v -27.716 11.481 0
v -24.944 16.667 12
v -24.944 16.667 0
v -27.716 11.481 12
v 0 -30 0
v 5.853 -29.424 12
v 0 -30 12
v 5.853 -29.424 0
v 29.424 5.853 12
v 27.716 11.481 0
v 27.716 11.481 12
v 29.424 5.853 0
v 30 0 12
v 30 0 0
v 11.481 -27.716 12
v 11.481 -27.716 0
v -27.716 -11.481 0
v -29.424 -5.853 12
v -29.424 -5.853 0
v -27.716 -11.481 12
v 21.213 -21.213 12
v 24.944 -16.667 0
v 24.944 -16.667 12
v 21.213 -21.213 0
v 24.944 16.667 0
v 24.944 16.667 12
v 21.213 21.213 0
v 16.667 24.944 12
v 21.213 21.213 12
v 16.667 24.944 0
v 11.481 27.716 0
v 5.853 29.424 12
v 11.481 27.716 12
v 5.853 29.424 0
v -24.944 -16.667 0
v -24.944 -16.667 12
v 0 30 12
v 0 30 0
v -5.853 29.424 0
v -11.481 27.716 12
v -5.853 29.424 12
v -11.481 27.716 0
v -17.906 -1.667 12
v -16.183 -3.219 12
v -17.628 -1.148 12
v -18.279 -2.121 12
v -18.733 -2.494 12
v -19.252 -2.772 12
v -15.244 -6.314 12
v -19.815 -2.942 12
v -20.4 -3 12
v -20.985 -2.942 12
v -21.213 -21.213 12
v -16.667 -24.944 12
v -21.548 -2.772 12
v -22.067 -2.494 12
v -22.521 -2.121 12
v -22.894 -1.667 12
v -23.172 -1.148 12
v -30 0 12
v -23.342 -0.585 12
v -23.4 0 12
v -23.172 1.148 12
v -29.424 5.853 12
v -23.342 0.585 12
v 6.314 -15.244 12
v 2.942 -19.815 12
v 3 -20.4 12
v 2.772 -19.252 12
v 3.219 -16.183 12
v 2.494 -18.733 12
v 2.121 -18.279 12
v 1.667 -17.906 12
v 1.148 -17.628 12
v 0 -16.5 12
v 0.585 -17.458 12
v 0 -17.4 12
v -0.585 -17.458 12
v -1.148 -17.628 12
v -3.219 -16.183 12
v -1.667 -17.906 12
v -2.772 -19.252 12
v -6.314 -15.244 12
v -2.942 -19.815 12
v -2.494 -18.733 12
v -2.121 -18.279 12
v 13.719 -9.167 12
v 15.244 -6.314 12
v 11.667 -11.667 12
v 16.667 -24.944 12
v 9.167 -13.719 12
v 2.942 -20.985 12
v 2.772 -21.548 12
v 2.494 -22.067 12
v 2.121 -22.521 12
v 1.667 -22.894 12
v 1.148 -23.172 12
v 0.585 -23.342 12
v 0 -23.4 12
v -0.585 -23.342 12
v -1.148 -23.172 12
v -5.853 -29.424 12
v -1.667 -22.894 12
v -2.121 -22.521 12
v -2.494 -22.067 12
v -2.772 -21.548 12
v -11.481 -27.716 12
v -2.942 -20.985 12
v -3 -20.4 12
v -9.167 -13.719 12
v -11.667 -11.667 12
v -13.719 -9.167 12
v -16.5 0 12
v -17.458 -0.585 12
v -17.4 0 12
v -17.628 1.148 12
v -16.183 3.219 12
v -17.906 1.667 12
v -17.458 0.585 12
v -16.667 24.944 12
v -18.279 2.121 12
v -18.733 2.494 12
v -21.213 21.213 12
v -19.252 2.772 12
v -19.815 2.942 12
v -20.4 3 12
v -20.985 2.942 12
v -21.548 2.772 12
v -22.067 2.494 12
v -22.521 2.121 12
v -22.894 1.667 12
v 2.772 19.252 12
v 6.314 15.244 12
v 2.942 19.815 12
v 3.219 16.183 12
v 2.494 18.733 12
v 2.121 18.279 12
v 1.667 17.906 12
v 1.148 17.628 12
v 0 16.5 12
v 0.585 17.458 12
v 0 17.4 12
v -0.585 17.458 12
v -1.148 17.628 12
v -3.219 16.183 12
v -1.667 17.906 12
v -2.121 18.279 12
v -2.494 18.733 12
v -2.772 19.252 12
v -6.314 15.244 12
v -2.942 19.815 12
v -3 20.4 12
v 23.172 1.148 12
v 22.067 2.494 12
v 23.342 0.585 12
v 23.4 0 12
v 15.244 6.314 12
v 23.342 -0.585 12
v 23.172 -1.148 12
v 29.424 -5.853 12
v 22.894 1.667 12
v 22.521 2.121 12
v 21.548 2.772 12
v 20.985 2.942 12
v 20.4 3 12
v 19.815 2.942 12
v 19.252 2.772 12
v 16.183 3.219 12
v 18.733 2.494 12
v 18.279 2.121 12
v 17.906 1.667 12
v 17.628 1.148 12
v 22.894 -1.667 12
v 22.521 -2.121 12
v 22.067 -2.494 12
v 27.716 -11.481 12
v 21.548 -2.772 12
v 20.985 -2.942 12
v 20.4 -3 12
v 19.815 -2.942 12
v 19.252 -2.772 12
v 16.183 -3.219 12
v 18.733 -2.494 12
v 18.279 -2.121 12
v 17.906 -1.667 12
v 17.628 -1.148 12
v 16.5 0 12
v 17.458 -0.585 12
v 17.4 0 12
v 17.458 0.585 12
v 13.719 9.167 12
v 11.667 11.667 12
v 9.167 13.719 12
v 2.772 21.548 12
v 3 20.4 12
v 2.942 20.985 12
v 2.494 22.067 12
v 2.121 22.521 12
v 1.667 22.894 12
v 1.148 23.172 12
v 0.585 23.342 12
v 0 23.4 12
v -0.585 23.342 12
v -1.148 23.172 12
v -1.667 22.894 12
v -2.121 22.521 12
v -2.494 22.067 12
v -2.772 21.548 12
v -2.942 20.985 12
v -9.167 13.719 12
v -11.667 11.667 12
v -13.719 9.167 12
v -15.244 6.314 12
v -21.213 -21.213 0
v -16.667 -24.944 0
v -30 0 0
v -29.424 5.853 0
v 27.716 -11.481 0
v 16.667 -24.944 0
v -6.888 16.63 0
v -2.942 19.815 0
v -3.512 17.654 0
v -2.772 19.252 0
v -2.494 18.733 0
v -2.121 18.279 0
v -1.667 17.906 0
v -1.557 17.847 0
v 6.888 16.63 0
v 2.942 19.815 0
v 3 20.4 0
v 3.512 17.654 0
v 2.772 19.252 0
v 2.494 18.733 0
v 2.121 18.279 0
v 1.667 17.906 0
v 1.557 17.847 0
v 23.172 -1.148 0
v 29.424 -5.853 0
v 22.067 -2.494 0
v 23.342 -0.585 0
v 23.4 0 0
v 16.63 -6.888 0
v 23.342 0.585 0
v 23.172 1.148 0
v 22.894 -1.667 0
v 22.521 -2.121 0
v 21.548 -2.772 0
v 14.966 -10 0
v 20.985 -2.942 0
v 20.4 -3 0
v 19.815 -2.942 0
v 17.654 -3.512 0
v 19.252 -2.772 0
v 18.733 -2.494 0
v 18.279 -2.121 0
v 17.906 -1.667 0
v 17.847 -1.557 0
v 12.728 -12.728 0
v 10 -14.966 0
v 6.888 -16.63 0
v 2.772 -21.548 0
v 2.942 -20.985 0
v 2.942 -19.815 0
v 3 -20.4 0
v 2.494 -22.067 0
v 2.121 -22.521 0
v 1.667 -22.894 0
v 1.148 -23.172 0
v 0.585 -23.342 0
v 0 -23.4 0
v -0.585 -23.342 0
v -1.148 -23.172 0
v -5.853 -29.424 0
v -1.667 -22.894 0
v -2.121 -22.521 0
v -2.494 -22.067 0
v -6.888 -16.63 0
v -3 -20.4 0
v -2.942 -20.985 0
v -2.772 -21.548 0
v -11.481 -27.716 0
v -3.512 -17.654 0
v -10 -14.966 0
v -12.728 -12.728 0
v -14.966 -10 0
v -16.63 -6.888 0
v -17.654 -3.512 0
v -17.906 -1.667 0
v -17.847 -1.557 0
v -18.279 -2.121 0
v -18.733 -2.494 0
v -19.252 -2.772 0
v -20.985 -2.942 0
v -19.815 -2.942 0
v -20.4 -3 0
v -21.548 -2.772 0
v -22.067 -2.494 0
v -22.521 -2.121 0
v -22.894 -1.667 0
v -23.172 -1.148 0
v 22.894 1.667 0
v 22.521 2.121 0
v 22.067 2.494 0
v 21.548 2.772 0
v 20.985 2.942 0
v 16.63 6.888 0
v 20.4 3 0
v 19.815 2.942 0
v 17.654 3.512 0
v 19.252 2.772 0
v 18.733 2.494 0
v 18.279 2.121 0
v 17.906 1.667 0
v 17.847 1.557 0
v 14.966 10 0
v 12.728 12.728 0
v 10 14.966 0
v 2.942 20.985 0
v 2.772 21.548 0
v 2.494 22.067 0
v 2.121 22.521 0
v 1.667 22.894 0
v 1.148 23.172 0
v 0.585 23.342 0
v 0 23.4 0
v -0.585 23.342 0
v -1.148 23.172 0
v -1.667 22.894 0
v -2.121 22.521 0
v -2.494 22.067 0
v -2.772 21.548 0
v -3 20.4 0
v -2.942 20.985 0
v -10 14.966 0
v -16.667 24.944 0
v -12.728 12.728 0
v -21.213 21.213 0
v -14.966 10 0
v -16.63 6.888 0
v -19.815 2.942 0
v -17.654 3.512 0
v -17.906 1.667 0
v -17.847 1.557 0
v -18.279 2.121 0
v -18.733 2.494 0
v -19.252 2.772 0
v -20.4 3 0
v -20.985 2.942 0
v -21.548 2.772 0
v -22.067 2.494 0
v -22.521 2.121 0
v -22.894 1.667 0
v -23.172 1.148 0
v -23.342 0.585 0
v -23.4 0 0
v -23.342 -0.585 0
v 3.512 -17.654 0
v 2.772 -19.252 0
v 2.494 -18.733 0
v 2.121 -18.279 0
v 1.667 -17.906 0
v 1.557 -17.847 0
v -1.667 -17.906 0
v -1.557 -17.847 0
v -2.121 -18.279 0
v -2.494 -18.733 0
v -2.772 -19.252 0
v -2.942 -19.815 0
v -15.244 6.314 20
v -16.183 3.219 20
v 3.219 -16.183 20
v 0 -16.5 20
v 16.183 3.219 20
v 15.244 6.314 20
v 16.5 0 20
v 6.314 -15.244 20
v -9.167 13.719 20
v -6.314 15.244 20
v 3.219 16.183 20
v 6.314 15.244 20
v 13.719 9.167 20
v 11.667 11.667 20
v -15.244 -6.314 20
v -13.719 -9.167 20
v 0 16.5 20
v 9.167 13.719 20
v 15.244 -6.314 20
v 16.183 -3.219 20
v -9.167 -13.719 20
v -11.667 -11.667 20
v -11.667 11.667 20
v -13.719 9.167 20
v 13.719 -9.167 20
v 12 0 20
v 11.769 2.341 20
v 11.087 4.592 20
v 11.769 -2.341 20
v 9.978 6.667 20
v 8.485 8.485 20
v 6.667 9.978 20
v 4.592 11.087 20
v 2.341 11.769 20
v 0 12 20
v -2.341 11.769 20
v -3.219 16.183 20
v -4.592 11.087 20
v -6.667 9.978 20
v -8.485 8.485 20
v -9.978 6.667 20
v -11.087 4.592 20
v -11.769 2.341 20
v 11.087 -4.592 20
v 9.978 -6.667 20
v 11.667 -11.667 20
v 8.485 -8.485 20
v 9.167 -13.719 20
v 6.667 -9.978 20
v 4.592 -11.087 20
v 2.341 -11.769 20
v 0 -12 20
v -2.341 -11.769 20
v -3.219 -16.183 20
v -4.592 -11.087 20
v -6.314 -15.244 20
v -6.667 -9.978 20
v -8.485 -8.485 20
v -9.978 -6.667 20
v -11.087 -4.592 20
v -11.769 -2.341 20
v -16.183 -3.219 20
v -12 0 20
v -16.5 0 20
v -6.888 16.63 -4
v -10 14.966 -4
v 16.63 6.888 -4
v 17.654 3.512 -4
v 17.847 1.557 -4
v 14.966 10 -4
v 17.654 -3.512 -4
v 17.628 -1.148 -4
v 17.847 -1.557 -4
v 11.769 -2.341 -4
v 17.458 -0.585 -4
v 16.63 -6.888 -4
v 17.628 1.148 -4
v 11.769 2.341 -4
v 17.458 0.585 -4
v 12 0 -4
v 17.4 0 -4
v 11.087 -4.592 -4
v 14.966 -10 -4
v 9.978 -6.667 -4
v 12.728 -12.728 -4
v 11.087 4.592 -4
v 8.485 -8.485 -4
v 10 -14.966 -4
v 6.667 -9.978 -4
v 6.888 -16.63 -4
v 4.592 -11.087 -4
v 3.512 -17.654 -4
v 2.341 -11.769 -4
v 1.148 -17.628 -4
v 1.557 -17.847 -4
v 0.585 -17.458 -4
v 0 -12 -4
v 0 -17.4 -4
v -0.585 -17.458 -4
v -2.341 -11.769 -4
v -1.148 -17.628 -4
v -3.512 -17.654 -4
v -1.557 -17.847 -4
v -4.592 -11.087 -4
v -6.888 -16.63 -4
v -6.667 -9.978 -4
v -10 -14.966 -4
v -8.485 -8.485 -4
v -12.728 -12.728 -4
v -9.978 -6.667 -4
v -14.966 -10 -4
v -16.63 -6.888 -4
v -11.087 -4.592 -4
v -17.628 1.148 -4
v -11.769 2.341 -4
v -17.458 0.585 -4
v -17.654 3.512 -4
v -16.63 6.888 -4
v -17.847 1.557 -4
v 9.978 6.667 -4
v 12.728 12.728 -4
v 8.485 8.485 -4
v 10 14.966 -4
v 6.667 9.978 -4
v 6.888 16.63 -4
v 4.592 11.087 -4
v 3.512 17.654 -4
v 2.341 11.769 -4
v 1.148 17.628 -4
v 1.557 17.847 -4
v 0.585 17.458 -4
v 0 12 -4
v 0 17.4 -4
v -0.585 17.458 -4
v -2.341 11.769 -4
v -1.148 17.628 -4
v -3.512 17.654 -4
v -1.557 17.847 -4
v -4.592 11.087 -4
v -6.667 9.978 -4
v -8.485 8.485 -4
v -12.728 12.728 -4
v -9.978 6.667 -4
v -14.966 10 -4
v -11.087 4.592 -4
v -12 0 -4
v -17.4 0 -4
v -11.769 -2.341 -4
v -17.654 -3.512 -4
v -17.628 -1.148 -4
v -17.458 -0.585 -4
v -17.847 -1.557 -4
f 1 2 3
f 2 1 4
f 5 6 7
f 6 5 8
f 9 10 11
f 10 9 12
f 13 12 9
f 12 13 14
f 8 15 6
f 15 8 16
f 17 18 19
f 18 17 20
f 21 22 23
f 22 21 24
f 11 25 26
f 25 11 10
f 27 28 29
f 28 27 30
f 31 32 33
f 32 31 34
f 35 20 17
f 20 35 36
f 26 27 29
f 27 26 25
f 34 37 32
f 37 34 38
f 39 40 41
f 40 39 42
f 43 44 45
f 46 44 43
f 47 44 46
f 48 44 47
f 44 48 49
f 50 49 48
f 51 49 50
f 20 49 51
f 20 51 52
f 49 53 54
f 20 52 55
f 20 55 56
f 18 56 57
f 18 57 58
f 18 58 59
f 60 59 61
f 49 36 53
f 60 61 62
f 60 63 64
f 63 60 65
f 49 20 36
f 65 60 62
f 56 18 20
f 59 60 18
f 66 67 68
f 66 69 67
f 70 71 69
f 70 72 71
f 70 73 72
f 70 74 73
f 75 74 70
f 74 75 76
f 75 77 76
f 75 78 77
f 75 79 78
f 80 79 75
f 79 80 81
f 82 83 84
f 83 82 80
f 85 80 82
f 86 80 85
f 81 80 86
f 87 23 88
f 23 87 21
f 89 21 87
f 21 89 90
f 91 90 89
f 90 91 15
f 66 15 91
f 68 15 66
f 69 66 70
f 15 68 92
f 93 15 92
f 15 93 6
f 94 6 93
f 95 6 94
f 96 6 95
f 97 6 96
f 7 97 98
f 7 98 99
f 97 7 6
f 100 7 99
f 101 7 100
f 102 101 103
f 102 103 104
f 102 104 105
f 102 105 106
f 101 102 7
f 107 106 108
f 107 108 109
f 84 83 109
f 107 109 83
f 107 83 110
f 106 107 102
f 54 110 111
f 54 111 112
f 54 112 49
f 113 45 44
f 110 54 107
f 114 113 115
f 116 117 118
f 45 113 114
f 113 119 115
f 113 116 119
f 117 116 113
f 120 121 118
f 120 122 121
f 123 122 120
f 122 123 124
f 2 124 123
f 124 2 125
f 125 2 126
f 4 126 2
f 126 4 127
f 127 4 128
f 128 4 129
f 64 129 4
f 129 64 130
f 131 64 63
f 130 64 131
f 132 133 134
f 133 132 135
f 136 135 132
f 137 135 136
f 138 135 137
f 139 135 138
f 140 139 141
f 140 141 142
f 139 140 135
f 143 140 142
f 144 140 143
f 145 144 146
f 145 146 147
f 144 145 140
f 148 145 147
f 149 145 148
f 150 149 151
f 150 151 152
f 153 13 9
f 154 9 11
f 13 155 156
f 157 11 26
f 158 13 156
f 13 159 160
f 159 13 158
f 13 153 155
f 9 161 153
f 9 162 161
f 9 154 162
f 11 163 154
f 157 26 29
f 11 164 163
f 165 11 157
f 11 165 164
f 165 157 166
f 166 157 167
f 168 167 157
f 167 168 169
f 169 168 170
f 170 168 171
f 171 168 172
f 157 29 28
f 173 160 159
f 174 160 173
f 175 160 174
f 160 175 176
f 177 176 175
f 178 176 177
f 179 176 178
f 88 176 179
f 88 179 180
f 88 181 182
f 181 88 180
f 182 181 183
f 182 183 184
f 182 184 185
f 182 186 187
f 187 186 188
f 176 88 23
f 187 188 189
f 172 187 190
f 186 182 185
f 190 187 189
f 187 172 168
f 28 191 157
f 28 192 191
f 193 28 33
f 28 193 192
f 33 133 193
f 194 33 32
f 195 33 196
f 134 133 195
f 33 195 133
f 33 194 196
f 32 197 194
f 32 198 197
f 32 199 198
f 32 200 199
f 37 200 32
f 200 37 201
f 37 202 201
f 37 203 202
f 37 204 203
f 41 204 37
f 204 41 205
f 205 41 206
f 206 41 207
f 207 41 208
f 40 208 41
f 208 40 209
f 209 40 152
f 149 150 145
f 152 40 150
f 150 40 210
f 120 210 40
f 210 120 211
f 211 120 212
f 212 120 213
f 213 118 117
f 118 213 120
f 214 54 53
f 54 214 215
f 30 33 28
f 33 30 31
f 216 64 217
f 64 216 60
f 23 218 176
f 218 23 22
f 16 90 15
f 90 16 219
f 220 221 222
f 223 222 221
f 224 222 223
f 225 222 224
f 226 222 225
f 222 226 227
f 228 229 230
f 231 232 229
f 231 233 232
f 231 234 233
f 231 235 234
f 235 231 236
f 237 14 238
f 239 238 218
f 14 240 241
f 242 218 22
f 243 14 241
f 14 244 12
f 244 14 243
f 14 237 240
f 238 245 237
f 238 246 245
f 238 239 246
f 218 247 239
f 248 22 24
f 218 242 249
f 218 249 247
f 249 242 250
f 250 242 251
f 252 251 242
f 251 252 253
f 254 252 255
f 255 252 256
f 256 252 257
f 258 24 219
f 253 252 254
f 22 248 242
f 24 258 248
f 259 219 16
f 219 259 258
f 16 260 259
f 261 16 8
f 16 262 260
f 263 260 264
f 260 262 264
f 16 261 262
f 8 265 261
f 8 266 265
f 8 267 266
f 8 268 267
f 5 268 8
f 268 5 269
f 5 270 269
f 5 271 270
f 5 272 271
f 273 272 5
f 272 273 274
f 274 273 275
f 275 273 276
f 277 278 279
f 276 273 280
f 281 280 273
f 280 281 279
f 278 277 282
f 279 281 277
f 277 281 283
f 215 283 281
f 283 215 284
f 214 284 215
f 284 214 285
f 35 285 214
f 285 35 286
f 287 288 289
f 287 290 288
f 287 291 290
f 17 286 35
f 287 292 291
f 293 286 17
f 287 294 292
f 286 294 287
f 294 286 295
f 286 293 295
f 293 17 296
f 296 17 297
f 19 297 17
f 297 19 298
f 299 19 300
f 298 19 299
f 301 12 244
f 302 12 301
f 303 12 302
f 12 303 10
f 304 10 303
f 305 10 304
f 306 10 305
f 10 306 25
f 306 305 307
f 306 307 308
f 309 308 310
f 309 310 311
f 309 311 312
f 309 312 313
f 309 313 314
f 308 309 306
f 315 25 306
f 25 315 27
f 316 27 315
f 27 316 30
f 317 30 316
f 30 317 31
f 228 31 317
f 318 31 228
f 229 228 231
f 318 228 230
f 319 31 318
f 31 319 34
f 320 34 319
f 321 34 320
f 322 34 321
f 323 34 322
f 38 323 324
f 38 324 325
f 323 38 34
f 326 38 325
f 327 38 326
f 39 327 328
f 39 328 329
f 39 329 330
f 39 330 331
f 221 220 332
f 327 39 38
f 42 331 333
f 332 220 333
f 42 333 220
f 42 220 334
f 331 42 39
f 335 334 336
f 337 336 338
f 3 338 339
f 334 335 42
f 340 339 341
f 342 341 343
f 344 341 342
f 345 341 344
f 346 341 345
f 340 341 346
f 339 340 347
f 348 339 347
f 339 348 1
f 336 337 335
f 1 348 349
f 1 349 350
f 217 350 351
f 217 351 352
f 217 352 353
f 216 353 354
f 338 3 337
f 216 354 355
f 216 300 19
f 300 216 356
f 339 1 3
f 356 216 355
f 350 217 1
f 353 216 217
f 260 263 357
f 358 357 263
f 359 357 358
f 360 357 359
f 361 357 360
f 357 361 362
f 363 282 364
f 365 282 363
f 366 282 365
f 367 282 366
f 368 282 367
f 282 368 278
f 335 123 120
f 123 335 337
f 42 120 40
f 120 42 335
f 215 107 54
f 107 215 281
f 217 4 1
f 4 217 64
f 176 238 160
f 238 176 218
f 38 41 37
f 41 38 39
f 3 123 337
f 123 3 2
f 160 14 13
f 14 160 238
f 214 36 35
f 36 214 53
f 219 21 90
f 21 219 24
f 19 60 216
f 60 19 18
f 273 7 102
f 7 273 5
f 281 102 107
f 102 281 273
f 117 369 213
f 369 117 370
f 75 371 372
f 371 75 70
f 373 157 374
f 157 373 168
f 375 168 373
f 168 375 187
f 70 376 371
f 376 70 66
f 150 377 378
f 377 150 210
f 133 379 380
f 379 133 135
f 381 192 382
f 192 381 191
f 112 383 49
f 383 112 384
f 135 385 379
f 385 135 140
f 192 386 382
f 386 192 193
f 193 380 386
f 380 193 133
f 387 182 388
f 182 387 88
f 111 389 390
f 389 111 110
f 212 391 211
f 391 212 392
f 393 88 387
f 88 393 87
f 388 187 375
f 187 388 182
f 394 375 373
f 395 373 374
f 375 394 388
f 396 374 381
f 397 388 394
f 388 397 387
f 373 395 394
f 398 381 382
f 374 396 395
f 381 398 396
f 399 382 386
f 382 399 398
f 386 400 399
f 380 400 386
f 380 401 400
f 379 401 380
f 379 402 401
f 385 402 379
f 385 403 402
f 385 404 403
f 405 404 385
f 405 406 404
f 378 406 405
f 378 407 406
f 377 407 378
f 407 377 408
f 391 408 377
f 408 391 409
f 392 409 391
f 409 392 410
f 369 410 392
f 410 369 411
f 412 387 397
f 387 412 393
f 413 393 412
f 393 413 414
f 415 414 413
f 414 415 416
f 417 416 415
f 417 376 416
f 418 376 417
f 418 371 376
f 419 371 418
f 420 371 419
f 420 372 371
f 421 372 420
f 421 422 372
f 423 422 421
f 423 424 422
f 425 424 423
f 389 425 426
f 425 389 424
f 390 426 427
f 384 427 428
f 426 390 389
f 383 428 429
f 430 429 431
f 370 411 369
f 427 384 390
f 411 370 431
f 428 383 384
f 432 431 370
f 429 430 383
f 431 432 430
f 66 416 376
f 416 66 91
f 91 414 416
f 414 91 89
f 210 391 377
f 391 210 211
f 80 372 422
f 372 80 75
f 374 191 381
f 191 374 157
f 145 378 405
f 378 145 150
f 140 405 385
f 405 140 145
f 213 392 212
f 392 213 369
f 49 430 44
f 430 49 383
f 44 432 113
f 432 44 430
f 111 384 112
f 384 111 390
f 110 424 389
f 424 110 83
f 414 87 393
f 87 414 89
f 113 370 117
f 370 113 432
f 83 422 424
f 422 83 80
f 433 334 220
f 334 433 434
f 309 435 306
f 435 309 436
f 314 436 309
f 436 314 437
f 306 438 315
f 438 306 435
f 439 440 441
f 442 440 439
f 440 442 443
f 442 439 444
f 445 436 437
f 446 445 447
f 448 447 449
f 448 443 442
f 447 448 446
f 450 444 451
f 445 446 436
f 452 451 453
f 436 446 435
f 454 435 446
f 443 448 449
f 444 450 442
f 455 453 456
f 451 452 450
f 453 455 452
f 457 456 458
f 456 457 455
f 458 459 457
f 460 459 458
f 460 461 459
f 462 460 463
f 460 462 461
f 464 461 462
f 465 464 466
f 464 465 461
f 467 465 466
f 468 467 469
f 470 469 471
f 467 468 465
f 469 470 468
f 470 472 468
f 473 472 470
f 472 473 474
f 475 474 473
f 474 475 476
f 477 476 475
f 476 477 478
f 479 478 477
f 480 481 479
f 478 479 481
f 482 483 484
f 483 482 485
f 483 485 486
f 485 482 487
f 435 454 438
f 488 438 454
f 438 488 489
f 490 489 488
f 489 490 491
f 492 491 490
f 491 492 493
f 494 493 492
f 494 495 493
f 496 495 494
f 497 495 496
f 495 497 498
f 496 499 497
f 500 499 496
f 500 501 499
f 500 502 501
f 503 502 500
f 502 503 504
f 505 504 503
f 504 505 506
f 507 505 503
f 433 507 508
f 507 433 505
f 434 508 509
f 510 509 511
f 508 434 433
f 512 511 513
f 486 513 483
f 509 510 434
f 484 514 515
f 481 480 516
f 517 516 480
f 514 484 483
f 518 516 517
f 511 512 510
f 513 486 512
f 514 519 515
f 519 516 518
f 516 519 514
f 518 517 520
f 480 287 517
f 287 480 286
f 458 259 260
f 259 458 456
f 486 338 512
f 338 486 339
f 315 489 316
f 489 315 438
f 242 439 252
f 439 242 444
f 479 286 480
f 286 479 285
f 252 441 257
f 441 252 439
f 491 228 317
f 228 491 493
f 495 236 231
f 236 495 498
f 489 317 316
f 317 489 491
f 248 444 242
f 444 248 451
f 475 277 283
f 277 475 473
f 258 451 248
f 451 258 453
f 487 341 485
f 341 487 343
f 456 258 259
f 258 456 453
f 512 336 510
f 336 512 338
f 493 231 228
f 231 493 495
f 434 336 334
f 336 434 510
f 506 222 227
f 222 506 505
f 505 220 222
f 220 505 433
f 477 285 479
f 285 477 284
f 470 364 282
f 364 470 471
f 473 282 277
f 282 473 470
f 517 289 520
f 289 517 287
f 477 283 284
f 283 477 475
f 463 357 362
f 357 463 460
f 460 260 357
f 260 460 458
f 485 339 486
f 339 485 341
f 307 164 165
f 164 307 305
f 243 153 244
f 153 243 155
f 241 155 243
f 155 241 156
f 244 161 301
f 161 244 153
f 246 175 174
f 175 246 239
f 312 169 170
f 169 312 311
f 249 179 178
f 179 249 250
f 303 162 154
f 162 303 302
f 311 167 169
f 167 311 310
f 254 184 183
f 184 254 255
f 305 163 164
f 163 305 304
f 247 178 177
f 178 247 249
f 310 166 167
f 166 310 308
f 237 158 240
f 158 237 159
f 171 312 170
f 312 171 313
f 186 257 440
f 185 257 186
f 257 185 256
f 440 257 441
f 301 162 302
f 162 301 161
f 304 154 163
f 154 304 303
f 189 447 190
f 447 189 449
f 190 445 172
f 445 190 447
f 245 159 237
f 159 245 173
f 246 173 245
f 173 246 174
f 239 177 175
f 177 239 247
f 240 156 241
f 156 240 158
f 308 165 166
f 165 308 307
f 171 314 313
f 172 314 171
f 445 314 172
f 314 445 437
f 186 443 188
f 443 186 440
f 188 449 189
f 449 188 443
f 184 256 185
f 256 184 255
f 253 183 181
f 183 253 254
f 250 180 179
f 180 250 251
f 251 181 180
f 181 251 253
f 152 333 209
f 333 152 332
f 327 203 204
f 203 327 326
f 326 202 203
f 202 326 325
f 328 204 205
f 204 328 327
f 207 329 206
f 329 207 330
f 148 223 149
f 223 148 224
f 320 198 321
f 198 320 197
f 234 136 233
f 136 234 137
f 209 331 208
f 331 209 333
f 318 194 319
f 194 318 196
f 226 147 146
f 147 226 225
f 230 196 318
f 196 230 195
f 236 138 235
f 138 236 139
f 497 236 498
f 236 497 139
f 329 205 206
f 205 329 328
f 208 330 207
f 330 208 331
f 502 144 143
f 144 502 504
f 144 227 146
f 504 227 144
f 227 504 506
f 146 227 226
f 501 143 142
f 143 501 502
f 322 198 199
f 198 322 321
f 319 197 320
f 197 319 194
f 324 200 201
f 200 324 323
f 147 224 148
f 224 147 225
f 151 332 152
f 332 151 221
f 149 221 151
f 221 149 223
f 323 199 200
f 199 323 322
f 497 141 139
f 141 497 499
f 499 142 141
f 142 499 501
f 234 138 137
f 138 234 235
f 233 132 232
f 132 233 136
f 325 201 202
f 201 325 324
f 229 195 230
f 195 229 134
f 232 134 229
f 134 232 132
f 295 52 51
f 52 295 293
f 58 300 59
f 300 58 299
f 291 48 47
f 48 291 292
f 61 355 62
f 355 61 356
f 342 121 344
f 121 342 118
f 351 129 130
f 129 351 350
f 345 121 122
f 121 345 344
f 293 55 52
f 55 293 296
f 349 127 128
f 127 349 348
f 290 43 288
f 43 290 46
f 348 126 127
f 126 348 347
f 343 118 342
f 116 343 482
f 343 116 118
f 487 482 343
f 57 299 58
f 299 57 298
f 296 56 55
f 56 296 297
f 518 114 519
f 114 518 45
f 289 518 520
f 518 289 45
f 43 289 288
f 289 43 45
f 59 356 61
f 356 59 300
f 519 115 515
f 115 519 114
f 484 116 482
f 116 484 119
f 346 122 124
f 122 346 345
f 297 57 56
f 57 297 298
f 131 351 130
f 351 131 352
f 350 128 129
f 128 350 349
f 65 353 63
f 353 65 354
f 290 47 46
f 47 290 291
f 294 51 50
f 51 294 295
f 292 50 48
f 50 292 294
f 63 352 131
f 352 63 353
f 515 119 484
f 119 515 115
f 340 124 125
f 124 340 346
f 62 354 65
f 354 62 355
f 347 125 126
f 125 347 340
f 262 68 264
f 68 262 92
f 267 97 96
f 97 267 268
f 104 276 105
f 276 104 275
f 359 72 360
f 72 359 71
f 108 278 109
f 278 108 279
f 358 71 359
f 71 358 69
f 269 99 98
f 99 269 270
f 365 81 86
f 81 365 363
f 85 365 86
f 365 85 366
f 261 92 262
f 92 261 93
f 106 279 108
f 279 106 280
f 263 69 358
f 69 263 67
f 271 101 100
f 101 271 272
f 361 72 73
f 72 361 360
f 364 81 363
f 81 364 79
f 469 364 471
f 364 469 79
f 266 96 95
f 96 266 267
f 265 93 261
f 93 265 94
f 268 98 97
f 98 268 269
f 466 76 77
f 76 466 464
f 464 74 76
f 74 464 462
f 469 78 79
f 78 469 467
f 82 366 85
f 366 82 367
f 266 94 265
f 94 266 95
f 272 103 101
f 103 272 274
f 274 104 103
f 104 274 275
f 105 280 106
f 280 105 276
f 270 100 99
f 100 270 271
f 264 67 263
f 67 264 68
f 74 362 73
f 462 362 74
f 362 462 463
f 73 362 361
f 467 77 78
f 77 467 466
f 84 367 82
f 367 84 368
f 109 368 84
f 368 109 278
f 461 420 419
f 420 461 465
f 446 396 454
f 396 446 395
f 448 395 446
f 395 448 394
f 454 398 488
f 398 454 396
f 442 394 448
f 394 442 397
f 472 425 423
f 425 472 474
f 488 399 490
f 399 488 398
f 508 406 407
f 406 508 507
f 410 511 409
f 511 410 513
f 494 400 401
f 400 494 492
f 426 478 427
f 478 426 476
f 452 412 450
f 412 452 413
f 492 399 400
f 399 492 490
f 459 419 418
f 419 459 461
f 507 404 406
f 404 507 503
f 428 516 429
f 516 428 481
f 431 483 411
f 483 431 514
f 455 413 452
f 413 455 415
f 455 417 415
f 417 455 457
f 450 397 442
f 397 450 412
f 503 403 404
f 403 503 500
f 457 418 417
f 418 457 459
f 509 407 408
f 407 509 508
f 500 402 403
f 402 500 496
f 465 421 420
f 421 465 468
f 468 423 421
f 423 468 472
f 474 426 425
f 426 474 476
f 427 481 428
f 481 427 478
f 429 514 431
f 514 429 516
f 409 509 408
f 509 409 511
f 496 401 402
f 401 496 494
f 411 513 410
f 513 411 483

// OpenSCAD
$fn = 32;

// ----------------------------------------------------------------------
// Bolt-circle flange: 60 mm outside, 4 bolt holes, bore 24 mm
// ----------------------------------------------------------------------

// --- parameters (mm) ---
flange_d = 60;            // flange outside diameter
flange_t = 12;            // flange thickness
bolts = 4;                // number of bolt holes
bolt_d = 6;               // bolt clearance
bolt_r = 20.4;            // bolt circle radius
bore_d = 24;              // centre bore
hub_d = 33;               // raised hub diameter
hub_h = 8;                // raised hub height
spigot_d = 36;            // spigot diameter
spigot_h = 5;             // spigot height below the flange
sink = 1;                 // overlap into the flange

module body() {
  cylinder(h = flange_t, d = flange_d);
  /* raised hub, sunk 1 mm into the flange */
  translate([0, 0, flange_t - 1]) cylinder(h = hub_h + 1, d = hub_d);
  /* spigot on the back face, sunk into the flange */
  translate([0, 0, -spigot_h + sink]) cylinder(h = spigot_h, d = spigot_d);
}

difference() {
  body();
  /* bolt circle */
  for (i = [0 : bolts - 1]) rotate([0, 0, i * 360 / bolts]) translate([bolt_r, 0, -spigot_h - 1]) cylinder(h = flange_t + hub_h + spigot_h + 3, d = bolt_d);
  translate([0, 0, -spigot_h - 1]) cylinder(h = flange_t + hub_h + spigot_h + 3, d = bore_d);
}
